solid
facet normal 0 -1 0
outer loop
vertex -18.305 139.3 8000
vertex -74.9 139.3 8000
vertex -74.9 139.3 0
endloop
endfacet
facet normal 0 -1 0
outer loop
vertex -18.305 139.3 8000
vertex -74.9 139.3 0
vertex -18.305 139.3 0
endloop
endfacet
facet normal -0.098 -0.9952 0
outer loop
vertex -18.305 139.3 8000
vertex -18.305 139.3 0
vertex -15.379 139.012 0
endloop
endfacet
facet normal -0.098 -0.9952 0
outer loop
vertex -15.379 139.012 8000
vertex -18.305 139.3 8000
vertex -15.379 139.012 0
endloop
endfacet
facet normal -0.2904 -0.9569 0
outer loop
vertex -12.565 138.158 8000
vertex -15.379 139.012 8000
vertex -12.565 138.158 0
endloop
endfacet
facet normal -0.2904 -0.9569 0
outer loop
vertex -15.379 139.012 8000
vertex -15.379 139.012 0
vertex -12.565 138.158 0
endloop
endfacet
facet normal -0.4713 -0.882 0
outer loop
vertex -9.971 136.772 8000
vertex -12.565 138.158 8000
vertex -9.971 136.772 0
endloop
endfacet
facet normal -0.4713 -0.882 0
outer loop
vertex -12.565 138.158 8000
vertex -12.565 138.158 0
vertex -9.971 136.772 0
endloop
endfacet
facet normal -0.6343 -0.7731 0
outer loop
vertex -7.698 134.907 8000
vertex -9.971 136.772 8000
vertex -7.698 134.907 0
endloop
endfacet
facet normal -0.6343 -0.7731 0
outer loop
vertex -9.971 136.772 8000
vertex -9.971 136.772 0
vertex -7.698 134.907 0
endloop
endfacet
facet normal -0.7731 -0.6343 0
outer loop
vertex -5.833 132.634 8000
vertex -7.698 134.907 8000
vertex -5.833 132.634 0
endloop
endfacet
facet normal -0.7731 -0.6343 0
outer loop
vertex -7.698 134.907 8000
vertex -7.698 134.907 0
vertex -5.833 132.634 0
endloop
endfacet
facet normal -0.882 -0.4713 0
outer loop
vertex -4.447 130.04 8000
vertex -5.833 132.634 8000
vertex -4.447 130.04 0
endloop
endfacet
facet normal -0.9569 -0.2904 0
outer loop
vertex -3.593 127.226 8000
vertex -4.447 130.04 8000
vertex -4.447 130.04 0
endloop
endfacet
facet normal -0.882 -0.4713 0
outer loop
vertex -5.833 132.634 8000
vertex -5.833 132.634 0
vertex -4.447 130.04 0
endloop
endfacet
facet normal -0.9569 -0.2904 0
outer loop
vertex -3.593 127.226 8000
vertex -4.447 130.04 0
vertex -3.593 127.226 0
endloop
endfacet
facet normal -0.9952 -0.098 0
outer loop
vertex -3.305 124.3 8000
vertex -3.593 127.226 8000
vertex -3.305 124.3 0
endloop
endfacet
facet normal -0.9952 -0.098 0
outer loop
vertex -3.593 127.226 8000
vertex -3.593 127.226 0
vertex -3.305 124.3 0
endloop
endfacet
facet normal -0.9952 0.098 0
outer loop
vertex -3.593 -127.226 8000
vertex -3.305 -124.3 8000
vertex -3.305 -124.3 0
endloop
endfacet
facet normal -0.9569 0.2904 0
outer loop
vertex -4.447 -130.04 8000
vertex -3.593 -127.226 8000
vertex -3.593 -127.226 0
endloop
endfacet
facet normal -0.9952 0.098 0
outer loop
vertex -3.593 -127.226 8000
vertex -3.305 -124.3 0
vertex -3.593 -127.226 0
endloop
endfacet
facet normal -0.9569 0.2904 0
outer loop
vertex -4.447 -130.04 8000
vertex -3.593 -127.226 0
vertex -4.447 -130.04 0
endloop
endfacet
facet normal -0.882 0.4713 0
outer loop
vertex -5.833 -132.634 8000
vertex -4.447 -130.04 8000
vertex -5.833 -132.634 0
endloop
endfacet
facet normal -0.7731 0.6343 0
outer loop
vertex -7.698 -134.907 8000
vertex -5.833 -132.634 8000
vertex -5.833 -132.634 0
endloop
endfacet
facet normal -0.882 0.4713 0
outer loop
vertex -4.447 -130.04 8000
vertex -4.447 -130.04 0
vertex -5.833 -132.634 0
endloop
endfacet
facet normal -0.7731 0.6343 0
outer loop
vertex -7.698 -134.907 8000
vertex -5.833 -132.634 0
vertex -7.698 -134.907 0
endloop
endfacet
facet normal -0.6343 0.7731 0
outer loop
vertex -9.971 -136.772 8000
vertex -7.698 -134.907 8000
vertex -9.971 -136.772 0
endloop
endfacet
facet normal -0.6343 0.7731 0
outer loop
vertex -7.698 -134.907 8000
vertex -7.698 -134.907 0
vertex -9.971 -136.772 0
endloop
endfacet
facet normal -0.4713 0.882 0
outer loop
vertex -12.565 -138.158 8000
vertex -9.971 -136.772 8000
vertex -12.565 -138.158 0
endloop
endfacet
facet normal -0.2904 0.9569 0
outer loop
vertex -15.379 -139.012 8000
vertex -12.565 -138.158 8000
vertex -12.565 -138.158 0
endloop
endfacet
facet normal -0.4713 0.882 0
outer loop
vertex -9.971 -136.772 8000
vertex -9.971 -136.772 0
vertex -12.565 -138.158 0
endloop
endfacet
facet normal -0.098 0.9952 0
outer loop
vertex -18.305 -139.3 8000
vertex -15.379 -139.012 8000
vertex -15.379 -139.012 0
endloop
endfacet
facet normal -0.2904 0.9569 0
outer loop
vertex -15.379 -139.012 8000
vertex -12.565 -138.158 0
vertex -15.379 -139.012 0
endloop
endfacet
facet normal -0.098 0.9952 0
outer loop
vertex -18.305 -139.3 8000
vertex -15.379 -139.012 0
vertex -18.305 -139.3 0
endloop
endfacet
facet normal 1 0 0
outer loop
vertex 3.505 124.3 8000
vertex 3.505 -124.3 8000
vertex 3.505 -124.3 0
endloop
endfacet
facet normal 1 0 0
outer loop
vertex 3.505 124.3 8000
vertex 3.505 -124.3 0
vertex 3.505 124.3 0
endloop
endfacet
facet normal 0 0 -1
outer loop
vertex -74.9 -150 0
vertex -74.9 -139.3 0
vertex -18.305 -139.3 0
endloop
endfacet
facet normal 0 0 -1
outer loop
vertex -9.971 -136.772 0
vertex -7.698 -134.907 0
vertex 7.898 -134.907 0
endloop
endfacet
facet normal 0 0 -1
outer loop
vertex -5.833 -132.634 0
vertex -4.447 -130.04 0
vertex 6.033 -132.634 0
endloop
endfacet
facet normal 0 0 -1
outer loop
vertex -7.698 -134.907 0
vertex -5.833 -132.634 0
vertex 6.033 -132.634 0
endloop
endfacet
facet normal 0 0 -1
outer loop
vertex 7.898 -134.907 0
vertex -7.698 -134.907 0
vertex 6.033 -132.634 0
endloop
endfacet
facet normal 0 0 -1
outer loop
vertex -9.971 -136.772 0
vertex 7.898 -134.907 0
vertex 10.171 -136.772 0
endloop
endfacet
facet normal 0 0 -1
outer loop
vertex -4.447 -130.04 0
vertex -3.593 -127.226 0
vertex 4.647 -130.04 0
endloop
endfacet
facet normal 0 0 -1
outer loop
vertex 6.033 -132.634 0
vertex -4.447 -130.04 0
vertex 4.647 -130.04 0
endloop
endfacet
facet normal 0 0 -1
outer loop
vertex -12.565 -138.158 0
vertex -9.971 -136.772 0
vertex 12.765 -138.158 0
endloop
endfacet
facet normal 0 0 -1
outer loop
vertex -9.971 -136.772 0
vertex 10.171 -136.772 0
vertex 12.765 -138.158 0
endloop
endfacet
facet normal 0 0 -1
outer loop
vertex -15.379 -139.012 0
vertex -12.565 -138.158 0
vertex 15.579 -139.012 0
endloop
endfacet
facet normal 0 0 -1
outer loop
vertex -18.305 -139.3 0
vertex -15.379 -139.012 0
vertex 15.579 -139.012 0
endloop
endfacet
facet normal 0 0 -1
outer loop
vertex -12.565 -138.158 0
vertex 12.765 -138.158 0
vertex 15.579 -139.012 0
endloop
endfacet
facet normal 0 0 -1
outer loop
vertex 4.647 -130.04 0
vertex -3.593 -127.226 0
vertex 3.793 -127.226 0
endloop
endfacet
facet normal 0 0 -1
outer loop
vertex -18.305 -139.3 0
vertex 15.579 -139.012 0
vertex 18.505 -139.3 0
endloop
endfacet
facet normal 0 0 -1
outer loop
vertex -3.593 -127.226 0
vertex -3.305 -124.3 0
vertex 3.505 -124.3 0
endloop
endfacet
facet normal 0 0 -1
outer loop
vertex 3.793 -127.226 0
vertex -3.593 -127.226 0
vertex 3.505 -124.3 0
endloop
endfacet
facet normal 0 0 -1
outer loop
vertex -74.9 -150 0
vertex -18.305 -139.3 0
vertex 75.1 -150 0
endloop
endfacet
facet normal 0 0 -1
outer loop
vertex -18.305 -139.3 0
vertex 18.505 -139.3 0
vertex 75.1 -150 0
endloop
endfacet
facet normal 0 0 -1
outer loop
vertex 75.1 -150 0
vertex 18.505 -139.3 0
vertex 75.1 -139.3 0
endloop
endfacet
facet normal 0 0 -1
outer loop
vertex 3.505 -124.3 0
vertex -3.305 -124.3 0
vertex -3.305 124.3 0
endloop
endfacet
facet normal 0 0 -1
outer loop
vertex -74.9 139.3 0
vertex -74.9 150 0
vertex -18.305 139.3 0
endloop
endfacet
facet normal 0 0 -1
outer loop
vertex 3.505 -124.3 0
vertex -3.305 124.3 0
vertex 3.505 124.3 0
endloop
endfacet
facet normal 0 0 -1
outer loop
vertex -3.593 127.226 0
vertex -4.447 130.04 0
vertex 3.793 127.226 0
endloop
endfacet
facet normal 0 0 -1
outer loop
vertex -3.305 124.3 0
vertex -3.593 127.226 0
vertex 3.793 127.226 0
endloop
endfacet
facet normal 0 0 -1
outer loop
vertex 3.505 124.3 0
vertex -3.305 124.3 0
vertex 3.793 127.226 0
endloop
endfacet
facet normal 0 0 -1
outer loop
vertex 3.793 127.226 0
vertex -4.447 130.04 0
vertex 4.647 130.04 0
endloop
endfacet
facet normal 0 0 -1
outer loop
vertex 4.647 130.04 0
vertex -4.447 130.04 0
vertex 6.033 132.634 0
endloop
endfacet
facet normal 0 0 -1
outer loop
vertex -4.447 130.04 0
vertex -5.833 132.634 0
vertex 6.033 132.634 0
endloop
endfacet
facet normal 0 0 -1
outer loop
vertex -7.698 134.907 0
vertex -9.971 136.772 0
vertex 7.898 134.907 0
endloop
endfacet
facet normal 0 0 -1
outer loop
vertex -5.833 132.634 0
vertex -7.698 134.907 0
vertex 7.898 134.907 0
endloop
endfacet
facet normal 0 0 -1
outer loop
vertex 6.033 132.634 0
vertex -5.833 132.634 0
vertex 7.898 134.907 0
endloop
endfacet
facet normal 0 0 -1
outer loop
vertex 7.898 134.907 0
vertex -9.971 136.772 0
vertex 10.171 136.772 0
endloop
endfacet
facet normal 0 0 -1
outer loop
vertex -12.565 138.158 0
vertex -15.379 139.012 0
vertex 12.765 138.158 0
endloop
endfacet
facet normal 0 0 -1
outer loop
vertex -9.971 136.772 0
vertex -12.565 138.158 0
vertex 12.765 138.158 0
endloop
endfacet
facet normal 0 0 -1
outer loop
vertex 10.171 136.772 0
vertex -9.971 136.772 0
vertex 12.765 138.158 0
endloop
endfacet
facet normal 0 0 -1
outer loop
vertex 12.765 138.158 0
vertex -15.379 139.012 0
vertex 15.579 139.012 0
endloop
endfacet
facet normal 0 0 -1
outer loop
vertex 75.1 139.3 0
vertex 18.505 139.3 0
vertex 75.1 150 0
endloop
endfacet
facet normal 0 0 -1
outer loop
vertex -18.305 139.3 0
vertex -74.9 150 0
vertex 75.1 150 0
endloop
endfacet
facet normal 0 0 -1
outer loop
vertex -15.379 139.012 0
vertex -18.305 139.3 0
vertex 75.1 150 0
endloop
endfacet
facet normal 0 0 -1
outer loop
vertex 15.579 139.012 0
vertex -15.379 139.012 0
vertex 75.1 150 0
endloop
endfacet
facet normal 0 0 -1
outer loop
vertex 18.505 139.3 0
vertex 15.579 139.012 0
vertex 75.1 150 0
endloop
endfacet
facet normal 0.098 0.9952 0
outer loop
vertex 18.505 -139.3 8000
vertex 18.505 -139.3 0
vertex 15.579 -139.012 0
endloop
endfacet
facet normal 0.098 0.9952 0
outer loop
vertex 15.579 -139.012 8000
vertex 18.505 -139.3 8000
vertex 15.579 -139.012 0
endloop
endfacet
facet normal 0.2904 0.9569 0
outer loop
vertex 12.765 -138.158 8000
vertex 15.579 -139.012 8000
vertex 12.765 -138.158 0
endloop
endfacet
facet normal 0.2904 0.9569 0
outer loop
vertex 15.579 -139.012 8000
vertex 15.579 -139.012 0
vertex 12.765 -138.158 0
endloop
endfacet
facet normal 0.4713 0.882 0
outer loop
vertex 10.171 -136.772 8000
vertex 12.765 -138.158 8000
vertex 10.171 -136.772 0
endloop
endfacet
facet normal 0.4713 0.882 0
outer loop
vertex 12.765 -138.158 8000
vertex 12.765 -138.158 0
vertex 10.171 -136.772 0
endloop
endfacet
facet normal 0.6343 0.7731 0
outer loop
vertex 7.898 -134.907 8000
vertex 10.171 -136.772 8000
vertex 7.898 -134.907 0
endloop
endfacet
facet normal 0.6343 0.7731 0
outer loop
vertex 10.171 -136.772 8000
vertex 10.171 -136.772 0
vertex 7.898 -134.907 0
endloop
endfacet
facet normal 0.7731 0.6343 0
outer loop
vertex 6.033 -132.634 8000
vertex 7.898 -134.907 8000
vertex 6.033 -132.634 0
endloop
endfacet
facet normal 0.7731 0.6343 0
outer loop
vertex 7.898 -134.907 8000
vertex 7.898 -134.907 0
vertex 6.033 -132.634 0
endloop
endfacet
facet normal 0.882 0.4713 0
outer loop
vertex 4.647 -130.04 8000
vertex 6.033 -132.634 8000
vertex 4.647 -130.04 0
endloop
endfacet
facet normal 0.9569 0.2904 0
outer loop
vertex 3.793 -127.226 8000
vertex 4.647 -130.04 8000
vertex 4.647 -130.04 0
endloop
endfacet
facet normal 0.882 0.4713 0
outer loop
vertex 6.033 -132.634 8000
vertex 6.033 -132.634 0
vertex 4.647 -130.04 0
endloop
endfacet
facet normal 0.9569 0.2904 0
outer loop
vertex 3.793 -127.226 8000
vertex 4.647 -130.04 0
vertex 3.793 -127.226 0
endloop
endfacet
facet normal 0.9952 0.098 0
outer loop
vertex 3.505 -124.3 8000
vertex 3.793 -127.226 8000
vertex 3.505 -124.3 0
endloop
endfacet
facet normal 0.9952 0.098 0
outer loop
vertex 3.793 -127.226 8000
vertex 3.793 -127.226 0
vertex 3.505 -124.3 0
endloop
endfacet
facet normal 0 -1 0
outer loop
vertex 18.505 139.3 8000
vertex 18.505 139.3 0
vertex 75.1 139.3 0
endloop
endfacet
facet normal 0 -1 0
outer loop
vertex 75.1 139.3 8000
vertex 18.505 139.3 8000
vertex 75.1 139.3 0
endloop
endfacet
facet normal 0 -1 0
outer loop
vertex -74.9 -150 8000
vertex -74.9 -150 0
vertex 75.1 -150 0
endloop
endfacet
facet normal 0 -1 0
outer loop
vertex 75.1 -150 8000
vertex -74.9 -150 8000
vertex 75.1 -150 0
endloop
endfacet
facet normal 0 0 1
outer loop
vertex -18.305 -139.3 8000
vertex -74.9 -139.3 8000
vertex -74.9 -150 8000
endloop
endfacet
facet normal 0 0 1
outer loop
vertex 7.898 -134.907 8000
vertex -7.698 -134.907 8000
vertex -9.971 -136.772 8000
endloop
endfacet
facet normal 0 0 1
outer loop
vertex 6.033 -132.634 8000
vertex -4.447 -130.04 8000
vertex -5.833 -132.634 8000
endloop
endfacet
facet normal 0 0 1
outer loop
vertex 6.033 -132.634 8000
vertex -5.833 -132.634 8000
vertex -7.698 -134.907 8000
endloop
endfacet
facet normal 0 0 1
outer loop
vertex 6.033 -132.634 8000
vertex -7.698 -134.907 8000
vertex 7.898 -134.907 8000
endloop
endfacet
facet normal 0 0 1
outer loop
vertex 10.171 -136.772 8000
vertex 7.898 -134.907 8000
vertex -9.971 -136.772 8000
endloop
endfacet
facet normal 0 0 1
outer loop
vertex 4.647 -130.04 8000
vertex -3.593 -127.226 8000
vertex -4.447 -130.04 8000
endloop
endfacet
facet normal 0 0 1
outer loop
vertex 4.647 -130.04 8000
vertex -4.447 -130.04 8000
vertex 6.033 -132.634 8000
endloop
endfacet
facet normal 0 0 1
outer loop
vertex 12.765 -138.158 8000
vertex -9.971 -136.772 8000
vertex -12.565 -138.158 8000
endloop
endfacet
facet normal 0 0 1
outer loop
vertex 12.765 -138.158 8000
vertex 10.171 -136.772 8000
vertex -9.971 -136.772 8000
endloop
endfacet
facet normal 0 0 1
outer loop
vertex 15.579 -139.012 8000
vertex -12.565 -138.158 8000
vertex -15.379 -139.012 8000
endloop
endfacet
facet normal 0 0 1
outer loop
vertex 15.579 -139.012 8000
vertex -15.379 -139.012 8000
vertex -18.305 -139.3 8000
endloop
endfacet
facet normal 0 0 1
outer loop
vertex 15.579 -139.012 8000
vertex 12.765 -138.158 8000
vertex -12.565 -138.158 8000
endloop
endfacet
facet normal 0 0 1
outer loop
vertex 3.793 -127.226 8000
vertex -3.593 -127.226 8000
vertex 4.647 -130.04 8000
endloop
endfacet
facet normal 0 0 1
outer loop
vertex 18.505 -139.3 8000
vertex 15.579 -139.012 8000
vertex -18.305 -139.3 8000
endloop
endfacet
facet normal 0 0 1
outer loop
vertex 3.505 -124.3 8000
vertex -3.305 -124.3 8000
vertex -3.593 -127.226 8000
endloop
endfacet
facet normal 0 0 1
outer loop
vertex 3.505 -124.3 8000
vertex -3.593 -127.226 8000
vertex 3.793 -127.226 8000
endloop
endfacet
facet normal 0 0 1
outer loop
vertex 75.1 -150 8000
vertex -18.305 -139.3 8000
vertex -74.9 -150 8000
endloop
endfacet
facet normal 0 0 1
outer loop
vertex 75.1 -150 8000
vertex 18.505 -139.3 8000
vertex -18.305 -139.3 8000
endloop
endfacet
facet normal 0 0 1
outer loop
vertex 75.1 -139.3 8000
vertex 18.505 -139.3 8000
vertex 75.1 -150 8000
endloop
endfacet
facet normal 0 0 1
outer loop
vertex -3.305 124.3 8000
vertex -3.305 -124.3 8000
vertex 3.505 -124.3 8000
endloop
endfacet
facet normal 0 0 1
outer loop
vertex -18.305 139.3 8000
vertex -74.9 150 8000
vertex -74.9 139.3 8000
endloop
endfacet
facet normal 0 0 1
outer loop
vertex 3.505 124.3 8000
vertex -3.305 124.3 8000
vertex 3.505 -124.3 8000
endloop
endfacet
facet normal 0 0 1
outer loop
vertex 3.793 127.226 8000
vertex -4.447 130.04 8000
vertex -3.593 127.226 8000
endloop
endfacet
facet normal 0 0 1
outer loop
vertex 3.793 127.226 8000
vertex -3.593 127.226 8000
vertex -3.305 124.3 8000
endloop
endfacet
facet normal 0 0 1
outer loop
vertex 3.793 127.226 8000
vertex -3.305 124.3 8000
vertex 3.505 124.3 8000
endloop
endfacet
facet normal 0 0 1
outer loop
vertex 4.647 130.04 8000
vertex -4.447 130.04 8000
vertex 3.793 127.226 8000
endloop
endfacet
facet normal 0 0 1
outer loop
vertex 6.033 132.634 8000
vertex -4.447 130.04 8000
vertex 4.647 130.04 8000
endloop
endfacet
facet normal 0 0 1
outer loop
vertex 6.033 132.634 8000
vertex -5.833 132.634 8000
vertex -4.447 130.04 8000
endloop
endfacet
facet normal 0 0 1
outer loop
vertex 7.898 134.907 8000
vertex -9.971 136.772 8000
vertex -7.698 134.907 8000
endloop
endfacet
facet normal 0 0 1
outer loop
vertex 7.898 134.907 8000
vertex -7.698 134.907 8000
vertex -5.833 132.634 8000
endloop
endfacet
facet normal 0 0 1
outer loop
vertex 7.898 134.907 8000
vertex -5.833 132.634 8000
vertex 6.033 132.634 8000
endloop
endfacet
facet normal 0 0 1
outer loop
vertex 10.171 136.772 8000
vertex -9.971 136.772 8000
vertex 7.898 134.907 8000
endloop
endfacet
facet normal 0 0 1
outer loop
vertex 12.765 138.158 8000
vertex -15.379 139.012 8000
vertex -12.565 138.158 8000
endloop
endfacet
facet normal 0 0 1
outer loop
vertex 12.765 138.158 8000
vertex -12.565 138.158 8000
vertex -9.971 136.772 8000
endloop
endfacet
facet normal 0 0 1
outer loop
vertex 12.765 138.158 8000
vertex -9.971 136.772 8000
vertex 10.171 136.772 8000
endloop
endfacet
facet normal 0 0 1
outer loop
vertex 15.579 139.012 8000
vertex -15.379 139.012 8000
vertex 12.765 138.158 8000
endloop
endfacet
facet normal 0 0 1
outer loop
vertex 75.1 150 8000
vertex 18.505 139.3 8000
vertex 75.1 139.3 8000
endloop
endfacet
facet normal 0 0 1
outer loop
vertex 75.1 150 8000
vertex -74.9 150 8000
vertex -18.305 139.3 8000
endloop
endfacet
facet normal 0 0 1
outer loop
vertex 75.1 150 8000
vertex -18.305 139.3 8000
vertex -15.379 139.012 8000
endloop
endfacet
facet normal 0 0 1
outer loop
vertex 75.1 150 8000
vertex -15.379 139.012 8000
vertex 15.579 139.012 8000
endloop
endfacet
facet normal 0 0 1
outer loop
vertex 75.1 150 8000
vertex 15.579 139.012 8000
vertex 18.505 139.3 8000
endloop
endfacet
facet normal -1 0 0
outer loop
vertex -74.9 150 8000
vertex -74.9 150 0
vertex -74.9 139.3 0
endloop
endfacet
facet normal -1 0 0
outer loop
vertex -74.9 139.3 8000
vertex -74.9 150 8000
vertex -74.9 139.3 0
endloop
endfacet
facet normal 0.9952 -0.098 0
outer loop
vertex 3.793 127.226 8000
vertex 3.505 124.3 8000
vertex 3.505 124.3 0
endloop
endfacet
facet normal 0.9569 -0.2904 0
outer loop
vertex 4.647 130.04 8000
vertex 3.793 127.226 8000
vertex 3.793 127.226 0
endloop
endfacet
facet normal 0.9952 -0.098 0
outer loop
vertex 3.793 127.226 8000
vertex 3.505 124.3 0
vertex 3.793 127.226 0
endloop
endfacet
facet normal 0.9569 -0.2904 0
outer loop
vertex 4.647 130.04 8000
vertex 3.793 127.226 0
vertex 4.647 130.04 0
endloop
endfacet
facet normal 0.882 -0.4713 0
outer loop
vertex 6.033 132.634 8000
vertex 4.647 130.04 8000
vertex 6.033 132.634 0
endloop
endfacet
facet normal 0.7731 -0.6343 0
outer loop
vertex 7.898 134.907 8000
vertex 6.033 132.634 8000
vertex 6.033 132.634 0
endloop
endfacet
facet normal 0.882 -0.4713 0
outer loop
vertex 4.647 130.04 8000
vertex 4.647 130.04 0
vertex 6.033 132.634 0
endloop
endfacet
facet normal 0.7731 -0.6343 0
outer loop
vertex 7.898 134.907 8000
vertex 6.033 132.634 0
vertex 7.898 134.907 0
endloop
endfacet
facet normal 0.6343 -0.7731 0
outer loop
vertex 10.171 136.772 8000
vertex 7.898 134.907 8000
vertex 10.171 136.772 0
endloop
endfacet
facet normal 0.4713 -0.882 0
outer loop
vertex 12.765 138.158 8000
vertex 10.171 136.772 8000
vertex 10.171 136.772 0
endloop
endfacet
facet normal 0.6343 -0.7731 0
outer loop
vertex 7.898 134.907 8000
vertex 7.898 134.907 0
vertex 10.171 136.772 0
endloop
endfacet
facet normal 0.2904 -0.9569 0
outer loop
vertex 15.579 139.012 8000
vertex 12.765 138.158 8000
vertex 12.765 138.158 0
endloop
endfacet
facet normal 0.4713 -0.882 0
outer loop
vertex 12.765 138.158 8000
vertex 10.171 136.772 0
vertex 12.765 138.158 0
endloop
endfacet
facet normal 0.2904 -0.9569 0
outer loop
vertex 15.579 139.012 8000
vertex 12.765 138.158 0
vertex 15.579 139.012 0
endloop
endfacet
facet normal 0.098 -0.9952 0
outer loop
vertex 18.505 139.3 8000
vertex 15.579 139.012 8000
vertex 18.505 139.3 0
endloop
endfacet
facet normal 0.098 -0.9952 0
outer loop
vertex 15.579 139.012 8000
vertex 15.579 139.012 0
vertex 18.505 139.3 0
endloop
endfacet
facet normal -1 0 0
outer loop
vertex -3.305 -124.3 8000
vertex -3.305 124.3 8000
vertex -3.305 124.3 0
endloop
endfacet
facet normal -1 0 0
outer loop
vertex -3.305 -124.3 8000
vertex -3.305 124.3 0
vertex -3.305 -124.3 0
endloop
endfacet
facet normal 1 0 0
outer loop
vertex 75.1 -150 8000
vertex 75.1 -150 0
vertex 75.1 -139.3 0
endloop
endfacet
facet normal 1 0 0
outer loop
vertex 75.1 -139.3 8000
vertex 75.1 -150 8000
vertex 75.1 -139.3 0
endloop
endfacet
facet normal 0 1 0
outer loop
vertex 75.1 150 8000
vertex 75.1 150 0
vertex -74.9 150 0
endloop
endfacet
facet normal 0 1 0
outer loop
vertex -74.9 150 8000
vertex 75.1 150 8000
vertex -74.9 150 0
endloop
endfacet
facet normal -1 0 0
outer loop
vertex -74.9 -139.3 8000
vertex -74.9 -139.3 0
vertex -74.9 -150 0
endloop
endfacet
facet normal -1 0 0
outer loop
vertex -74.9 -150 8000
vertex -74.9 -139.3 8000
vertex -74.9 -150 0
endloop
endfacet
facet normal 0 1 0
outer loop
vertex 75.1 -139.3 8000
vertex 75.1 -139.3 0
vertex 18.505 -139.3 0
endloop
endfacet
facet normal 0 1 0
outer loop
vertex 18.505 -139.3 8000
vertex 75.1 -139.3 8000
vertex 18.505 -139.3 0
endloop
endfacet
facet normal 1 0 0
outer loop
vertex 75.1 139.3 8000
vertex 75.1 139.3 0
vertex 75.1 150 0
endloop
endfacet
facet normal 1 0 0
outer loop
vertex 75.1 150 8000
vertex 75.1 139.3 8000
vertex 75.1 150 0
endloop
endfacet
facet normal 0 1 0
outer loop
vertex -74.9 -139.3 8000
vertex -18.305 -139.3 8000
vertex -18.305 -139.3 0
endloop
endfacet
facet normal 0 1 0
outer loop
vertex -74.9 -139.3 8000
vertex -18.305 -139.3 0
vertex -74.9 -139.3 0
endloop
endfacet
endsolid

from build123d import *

# Parameters (mm, degrees)
F1_DEPTH = 8000


with BuildPart() as f1:
    # F0 (on Top) → F1 (new body)
    with BuildSketch(Plane.XY):
        with BuildLine():
            Line((3.505, -124.3), (3.505, 0))
            Line((3.505, 0), (3.505, 124.3))
            ThreePointArc((3.505, 124.3), (7.898398, 134.906602), (18.505, 139.3))
            Line((18.505, 139.3), (75.1, 139.3))
            Line((75.1, 139.3), (75.1, 150))
            Line((75.1, 150), (-74.9, 150))
            Line((-74.9, 150), (-74.9, 139.3))
            Line((-74.9, 139.3), (-18.305, 139.3))
            ThreePointArc((-18.305, 139.3), (-7.698398, 134.906602), (-3.305, 124.3))
            Line((-3.305, 124.3), (-3.305, 0))
            Line((-3.305, 0), (-3.305, -124.3))
            ThreePointArc((-3.305, -124.3), (-7.698398, -134.906602), (-18.305, -139.3))
            Line((-18.305, -139.3), (-74.9, -139.3))
            Line((-74.9, -139.3), (-74.9, -150))
            Line((-74.9, -150), (75.1, -150))
            Line((75.1, -150), (75.1, -139.3))
            Line((75.1, -139.3), (18.505, -139.3))
            ThreePointArc((18.505, -139.3), (7.898398, -134.906602), (3.505, -124.3))
        make_face()
    extrude(amount=F1_DEPTH)


solid = f1.part
